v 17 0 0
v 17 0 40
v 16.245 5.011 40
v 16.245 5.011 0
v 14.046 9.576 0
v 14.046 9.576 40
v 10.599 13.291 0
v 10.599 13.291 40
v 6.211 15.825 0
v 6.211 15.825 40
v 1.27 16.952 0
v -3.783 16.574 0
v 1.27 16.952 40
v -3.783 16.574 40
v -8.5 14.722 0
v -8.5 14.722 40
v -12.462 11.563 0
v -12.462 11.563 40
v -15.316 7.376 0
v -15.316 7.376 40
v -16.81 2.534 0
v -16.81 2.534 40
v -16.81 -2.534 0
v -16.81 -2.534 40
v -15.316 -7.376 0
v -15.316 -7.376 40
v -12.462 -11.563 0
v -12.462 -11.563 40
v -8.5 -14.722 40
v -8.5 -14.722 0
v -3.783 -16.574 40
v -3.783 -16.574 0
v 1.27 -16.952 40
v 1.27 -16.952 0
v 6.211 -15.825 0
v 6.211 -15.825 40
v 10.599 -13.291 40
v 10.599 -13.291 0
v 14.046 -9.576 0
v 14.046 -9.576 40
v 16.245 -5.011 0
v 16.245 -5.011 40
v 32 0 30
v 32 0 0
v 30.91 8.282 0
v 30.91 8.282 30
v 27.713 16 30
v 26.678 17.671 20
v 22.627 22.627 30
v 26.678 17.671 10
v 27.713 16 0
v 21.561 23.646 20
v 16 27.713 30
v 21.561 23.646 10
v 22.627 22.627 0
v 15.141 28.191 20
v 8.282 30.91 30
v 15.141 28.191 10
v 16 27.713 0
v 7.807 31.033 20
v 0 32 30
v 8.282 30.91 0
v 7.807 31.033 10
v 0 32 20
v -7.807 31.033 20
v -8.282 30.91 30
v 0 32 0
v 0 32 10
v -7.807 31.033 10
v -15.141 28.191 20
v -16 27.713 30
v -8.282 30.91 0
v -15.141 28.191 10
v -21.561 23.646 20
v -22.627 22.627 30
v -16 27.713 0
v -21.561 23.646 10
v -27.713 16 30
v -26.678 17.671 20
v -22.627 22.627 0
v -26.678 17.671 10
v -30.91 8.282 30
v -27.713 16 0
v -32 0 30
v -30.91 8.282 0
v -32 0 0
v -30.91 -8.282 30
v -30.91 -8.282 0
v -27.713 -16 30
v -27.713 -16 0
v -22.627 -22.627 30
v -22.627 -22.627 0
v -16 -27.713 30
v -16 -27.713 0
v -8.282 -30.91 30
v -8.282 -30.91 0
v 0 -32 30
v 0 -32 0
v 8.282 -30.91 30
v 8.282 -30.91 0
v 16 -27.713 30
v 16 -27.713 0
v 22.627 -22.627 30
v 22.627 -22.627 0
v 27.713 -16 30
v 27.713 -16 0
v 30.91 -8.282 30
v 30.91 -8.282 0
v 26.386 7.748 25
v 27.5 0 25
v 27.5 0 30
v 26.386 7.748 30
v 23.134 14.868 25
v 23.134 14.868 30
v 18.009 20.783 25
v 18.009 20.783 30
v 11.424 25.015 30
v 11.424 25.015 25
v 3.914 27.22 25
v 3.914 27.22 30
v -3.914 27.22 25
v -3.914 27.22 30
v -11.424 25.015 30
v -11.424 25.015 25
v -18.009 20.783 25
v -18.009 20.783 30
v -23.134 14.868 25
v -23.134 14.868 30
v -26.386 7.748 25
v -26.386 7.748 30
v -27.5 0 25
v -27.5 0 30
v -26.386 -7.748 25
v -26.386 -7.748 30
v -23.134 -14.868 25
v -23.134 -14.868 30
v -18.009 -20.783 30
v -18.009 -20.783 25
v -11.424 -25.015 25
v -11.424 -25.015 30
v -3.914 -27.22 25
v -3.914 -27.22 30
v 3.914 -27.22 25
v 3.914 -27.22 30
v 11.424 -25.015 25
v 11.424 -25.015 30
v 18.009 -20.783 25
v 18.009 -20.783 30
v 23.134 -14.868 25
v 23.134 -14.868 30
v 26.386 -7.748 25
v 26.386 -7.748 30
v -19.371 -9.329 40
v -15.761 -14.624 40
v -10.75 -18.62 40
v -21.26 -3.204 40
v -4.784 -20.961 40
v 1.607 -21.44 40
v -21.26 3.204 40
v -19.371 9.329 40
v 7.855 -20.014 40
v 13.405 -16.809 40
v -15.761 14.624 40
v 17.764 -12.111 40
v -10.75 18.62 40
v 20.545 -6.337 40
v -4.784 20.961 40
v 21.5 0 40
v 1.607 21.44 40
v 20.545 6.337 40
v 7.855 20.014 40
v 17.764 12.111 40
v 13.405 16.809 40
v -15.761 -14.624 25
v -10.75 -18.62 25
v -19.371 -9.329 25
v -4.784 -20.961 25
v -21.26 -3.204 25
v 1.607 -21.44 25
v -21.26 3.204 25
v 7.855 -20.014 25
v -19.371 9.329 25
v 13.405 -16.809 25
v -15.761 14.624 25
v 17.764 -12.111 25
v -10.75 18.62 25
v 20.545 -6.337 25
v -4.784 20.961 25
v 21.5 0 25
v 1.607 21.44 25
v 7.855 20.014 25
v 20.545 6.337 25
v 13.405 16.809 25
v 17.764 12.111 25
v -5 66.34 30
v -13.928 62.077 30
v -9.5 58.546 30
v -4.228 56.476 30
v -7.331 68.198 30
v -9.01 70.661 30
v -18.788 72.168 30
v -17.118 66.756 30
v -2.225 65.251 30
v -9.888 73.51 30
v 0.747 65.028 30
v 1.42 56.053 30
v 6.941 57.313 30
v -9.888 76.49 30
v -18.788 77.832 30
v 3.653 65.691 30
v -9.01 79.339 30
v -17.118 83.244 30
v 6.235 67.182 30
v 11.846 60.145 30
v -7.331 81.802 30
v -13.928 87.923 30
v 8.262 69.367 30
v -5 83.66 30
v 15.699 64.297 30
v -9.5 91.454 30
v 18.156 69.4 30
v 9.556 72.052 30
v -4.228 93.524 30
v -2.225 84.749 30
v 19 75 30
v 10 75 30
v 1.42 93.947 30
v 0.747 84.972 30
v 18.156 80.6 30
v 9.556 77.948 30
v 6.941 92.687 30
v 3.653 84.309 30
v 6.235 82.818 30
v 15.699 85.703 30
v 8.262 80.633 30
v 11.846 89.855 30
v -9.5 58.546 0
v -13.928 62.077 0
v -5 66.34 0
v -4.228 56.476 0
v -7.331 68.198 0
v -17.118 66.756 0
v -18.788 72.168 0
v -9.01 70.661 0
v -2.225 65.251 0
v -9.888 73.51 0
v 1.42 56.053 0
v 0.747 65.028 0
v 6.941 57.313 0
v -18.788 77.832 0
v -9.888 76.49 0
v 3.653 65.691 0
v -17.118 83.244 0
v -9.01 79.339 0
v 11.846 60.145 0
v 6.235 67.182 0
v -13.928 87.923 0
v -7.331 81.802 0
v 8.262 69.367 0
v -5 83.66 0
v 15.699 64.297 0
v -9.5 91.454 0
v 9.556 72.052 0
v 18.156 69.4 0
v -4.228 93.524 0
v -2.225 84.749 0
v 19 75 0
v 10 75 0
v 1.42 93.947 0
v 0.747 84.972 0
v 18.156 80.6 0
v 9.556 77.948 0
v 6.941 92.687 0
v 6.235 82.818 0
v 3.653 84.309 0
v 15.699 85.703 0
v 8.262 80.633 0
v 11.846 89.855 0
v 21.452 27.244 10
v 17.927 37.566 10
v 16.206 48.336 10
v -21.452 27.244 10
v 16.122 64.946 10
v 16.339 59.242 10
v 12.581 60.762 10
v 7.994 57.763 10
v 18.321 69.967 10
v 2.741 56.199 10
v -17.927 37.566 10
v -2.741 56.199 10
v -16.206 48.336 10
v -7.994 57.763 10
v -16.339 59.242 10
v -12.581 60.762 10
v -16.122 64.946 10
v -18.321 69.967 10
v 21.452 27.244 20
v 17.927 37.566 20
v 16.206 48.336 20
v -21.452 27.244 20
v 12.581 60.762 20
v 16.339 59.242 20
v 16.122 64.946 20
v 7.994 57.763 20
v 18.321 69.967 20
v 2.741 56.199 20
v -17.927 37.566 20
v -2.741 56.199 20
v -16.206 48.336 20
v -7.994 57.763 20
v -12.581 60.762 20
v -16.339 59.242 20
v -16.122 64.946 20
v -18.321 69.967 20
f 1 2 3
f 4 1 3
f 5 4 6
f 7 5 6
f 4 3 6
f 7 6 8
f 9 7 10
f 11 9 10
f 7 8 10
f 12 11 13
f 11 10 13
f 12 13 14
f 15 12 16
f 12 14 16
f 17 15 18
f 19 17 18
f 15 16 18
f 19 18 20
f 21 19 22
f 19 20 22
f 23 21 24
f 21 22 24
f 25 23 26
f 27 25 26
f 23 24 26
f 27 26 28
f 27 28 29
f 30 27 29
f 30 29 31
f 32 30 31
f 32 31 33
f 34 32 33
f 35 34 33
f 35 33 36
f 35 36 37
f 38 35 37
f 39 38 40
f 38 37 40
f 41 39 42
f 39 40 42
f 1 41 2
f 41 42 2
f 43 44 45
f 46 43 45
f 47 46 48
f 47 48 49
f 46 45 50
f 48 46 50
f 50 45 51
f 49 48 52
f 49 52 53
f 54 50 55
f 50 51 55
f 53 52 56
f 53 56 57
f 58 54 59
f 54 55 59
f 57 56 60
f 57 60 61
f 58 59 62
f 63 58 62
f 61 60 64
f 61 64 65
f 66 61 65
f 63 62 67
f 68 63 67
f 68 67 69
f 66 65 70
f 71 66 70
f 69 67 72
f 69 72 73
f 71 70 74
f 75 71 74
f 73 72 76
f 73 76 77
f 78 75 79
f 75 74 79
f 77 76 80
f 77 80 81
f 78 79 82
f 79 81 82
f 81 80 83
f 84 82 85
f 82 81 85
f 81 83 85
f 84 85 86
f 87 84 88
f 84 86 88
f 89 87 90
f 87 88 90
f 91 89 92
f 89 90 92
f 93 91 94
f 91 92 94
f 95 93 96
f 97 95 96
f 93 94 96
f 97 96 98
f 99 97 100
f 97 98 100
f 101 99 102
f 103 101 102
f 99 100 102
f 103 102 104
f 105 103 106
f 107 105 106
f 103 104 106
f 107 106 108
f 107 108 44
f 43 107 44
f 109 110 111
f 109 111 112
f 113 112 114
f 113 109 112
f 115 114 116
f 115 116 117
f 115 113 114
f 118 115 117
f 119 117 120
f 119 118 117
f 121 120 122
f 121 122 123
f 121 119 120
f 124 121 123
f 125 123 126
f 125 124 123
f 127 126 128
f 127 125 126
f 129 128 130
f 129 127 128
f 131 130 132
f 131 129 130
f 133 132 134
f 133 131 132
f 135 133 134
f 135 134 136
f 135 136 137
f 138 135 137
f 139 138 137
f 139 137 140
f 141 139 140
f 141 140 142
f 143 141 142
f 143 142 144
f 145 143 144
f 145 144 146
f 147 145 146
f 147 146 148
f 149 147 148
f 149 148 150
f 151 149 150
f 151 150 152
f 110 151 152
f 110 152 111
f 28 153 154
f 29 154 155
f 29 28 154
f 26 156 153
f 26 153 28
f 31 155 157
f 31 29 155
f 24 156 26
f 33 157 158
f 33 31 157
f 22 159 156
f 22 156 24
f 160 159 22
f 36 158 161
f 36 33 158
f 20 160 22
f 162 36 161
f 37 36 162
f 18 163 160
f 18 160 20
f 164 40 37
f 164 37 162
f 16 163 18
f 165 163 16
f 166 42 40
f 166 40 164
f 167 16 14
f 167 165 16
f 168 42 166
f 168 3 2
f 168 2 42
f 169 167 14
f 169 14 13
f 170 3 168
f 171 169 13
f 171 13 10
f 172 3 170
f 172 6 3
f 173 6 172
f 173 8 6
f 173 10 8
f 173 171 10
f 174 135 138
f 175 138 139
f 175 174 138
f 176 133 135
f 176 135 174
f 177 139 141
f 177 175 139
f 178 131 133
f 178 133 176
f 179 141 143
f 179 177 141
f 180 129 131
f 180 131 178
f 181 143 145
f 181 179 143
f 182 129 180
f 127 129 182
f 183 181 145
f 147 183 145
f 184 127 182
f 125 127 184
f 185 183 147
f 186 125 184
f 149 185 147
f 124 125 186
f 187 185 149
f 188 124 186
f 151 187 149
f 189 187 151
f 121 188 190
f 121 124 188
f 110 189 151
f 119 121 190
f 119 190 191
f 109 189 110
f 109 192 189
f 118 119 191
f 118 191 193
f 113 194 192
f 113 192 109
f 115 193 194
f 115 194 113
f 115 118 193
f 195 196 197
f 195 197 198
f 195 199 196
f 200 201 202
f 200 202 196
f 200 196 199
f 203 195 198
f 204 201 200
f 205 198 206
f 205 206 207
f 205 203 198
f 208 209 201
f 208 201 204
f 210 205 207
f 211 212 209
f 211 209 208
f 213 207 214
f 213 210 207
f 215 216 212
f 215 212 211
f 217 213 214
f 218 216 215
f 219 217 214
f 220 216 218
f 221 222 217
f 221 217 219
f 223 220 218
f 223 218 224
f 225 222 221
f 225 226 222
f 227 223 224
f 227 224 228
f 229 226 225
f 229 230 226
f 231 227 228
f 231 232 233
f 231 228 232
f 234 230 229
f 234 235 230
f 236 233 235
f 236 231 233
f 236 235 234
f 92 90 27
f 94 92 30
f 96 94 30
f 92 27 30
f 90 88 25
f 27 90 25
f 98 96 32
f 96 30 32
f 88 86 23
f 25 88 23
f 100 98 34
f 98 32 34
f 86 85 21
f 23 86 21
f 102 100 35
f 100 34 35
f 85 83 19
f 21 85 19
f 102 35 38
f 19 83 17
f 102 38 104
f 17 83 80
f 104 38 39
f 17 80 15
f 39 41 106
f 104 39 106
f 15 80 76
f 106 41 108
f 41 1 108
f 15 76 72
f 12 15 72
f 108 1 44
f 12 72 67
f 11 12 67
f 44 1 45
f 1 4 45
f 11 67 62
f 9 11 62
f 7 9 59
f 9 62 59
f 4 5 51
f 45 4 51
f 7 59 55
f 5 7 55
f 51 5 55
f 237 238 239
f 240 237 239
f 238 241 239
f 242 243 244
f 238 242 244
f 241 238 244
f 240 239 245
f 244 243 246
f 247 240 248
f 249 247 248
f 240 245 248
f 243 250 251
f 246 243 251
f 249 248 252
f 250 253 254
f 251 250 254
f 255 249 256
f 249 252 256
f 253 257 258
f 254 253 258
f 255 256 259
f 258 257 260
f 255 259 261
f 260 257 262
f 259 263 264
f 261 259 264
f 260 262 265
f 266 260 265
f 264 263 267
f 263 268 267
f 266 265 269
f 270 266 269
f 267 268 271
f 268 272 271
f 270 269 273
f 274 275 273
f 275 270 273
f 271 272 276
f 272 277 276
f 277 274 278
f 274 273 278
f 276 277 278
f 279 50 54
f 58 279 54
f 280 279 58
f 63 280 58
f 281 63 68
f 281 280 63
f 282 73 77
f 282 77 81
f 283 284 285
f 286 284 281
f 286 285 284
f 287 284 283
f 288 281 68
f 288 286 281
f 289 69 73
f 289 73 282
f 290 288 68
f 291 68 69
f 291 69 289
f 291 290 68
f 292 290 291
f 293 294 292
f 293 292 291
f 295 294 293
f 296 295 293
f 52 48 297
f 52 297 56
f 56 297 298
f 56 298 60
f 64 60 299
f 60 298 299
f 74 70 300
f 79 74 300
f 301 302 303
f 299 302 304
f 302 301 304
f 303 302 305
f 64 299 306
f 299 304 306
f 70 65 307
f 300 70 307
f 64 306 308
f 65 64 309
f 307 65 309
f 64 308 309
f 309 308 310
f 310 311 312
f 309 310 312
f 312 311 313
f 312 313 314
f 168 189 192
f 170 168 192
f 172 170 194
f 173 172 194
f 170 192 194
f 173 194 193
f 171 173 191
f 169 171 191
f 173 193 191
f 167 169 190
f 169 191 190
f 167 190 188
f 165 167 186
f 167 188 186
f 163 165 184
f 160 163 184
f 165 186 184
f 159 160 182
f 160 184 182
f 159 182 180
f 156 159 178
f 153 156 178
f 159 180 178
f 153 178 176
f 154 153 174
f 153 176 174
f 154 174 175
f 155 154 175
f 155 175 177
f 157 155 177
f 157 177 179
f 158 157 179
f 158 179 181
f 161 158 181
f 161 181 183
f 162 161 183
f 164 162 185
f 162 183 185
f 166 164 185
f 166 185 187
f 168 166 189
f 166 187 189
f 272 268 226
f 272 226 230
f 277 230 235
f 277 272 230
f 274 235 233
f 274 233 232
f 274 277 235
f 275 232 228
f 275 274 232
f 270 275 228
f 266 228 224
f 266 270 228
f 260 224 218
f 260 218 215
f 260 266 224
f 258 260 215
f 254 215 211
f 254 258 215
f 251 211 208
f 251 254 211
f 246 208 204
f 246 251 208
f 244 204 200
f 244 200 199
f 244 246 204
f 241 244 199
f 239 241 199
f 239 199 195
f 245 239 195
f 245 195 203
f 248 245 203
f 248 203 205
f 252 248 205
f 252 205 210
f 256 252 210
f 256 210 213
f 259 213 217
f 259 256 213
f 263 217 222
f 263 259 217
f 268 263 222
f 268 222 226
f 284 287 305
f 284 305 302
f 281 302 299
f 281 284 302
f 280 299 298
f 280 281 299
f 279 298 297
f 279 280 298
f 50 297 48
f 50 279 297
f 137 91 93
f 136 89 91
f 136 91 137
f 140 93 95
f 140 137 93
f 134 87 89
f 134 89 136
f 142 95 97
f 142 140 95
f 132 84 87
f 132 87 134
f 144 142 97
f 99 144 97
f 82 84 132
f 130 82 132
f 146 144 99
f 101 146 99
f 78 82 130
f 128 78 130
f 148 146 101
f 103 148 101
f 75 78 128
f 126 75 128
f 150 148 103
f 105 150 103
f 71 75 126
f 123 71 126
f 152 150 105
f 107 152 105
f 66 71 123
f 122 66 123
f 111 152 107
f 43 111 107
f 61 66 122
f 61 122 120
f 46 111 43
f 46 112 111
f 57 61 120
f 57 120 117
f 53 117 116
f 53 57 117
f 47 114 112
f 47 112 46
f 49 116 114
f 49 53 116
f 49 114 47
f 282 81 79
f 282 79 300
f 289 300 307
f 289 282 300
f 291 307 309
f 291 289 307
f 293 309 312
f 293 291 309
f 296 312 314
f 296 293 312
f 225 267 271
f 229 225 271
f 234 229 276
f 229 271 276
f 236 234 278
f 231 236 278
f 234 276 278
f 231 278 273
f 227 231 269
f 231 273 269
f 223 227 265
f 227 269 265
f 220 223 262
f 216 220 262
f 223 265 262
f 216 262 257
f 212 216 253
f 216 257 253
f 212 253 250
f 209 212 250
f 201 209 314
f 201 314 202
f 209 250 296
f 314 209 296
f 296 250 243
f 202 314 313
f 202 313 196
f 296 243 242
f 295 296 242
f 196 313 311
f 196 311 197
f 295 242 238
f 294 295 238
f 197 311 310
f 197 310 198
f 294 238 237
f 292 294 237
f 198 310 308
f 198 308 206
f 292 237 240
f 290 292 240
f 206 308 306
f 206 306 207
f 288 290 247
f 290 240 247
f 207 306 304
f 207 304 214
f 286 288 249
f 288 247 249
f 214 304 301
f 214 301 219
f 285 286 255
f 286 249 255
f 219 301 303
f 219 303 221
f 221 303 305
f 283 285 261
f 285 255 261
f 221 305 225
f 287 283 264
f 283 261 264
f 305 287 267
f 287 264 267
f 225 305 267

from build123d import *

# Parameters (mm, degrees)
SKETCH2_R                = 32
SKETCH2_R_2              = 27.5
BOSS_EXTRUDE1_DEPTH      = 30
BOSS_EXTRUDE2_DEPTH      = 5
BOSS_EXTRUDE2_DEPTH_BACK = 5
BOSS_EXTRUDE3_DEPTH      = 15
BOSS_EXTRUDE3_DEPTH_BACK = 15
SKETCH4_R                = 19
SKETCH4_R_2              = 10
BOSS_EXTRUDE4_DEPTH      = 10
BOSS_EXTRUDE4_DEPTH_BACK = 15
SKETCH5_R                = 27.5
SKETCH6_R                = 21.5
BOSS_EXTRUDE5_DEPTH      = 15
SKETCH7_R                = 17
CUT_EXTRUDE1_DEPTH       = 40


with BuildPart() as part:
    # Sketch2 → Boss-Extrude1 (new body)
    with BuildSketch(Plane.XY):
        Circle(SKETCH2_R)
        Circle(SKETCH2_R_2, mode=Mode.SUBTRACT)
    extrude(amount=BOSS_EXTRUDE1_DEPTH)

    # Sketch3 → Boss-Extrude2 (add, two sides: drawn at the far end of the back side and taken through both)
    with BuildSketch(Plane.XY.offset(15).offset(-BOSS_EXTRUDE2_DEPTH_BACK)):
        with BuildLine():
            ThreePointArc((-18.321243986, 69.966907631), (0, 56), (18.321243986, 69.966907631))
            ThreePointArc((18.321243986, 69.966907631), (16.836772686, 42.914041255), (26.678302647, 17.671111111))
            ThreePointArc((26.678302647, 17.671111111), (0, 32), (-26.678302647, 17.671111111))
            ThreePointArc((-26.678302647, 17.671111111), (-16.836772686, 42.914041255), (-18.321243986, 69.966907631))
        make_face()
    extrude(amount=BOSS_EXTRUDE2_DEPTH + BOSS_EXTRUDE2_DEPTH_BACK)

    # Sketch4 → Boss-Extrude3 (add, two sides: drawn at the far end of the back side and taken through both)
    with BuildSketch(Plane.XY.offset(15).offset(-BOSS_EXTRUDE3_DEPTH_BACK)):
        with Locations((0, 75)):
            Circle(SKETCH4_R)
        with Locations((0, 75)):
            Circle(SKETCH4_R_2, mode=Mode.SUBTRACT)
    extrude(amount=BOSS_EXTRUDE3_DEPTH + BOSS_EXTRUDE3_DEPTH_BACK)

    # Sketch5 → Boss-Extrude4 (add, two sides: drawn at the far end of the back side and taken through both)
    with BuildSketch(Plane.XY.offset(15).offset(-BOSS_EXTRUDE4_DEPTH_BACK)):
        Circle(SKETCH5_R)
    extrude(amount=BOSS_EXTRUDE4_DEPTH + BOSS_EXTRUDE4_DEPTH_BACK)

    # Sketch6 → Boss-Extrude5 (add)
    with BuildSketch(Plane.XY.offset(25)):
        Circle(SKETCH6_R)
    extrude(amount=BOSS_EXTRUDE5_DEPTH)

    # Sketch7 → Cut-Extrude1 (cut)
    with BuildSketch(Plane.XY.offset(40)):
        Circle(SKETCH7_R)
    extrude(amount=-CUT_EXTRUDE1_DEPTH, mode=Mode.SUBTRACT)


solid = part.part
